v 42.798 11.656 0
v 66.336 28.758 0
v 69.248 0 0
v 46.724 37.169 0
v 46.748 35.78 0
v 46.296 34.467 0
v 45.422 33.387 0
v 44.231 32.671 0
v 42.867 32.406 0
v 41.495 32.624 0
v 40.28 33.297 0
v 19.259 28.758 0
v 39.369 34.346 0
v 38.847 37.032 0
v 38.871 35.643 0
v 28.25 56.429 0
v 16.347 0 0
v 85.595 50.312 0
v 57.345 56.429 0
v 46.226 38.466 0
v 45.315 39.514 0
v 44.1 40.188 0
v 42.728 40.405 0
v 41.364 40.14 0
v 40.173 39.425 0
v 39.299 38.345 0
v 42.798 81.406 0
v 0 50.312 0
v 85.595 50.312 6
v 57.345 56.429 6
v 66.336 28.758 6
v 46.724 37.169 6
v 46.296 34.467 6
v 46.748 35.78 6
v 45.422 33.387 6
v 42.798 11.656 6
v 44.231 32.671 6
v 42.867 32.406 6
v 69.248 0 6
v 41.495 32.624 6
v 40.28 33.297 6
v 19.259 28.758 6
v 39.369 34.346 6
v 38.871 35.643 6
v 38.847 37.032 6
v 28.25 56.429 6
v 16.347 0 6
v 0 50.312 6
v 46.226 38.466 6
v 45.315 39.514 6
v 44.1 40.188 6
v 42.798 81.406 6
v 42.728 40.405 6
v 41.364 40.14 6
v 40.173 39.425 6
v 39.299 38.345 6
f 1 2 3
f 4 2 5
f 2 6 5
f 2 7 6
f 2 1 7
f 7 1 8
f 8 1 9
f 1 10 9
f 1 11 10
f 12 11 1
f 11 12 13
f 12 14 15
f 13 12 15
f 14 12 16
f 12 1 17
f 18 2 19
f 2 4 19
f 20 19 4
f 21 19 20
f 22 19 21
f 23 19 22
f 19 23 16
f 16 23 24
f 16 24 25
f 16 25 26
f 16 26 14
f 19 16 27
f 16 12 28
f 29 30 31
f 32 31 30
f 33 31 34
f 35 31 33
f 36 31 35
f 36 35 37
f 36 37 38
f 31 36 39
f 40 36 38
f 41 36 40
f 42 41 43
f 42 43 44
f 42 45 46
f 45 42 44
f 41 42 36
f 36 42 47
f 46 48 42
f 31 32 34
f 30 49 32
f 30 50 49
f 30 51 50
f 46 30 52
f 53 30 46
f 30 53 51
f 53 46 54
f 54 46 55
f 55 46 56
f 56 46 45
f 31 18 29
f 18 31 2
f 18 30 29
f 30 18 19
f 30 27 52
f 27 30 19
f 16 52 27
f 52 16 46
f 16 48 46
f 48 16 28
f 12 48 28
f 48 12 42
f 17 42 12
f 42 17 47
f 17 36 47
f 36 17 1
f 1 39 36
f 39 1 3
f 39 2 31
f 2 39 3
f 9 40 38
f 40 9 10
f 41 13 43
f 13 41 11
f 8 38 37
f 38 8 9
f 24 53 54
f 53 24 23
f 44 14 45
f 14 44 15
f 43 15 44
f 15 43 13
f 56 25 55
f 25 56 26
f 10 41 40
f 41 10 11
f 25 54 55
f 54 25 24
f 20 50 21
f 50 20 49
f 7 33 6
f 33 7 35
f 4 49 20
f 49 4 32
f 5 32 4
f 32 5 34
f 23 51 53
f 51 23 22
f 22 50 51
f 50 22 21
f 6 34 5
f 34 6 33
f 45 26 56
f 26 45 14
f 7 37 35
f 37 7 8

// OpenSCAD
$fn = 32;

// ----------------------------------------------------------------------
// Star wheel: 5-point star, R45
// ----------------------------------------------------------------------

// --- parameters (mm) ---
n_points = 5;             // number of points / teeth
r_out = 45;               // tip radius
r_in = 24.75;             // root radius
bore_r = 4;               // centre bore radius
plate_t = 6;              // plate thickness, Z (extrusion height)
bore_d = 8;               // centre bore diameter

profile = [[42.798, 81.406], [28.25, 56.429], [0, 50.312], [19.259, 28.758], [16.347, 0], [42.798, 11.656], [69.248, 0], [66.336, 28.758], [85.595, 50.312], [57.345, 56.429]];  // primary outline, 10 points, counter clockwise
void_1 = [[46.724, 37.169], [46.226, 38.466], [45.315, 39.514], [44.1, 40.188], [42.728, 40.405], [41.364, 40.14], [40.173, 39.425], [39.299, 38.345], [38.847, 37.032], [38.871, 35.643], [39.369, 34.346], [40.28, 33.297], [41.495, 32.624], [42.867, 32.406], [44.231, 32.671], [45.422, 33.387], [46.296, 34.467], [46.748, 35.78]];  // centre bore, 18 points

// --- the one profile operation ---
difference() {
  linear_extrude(height = plate_t) polygon(points = profile);
  translate([0, 0, -1])
    linear_extrude(height = plate_t + 2) polygon(points = void_1);
}
